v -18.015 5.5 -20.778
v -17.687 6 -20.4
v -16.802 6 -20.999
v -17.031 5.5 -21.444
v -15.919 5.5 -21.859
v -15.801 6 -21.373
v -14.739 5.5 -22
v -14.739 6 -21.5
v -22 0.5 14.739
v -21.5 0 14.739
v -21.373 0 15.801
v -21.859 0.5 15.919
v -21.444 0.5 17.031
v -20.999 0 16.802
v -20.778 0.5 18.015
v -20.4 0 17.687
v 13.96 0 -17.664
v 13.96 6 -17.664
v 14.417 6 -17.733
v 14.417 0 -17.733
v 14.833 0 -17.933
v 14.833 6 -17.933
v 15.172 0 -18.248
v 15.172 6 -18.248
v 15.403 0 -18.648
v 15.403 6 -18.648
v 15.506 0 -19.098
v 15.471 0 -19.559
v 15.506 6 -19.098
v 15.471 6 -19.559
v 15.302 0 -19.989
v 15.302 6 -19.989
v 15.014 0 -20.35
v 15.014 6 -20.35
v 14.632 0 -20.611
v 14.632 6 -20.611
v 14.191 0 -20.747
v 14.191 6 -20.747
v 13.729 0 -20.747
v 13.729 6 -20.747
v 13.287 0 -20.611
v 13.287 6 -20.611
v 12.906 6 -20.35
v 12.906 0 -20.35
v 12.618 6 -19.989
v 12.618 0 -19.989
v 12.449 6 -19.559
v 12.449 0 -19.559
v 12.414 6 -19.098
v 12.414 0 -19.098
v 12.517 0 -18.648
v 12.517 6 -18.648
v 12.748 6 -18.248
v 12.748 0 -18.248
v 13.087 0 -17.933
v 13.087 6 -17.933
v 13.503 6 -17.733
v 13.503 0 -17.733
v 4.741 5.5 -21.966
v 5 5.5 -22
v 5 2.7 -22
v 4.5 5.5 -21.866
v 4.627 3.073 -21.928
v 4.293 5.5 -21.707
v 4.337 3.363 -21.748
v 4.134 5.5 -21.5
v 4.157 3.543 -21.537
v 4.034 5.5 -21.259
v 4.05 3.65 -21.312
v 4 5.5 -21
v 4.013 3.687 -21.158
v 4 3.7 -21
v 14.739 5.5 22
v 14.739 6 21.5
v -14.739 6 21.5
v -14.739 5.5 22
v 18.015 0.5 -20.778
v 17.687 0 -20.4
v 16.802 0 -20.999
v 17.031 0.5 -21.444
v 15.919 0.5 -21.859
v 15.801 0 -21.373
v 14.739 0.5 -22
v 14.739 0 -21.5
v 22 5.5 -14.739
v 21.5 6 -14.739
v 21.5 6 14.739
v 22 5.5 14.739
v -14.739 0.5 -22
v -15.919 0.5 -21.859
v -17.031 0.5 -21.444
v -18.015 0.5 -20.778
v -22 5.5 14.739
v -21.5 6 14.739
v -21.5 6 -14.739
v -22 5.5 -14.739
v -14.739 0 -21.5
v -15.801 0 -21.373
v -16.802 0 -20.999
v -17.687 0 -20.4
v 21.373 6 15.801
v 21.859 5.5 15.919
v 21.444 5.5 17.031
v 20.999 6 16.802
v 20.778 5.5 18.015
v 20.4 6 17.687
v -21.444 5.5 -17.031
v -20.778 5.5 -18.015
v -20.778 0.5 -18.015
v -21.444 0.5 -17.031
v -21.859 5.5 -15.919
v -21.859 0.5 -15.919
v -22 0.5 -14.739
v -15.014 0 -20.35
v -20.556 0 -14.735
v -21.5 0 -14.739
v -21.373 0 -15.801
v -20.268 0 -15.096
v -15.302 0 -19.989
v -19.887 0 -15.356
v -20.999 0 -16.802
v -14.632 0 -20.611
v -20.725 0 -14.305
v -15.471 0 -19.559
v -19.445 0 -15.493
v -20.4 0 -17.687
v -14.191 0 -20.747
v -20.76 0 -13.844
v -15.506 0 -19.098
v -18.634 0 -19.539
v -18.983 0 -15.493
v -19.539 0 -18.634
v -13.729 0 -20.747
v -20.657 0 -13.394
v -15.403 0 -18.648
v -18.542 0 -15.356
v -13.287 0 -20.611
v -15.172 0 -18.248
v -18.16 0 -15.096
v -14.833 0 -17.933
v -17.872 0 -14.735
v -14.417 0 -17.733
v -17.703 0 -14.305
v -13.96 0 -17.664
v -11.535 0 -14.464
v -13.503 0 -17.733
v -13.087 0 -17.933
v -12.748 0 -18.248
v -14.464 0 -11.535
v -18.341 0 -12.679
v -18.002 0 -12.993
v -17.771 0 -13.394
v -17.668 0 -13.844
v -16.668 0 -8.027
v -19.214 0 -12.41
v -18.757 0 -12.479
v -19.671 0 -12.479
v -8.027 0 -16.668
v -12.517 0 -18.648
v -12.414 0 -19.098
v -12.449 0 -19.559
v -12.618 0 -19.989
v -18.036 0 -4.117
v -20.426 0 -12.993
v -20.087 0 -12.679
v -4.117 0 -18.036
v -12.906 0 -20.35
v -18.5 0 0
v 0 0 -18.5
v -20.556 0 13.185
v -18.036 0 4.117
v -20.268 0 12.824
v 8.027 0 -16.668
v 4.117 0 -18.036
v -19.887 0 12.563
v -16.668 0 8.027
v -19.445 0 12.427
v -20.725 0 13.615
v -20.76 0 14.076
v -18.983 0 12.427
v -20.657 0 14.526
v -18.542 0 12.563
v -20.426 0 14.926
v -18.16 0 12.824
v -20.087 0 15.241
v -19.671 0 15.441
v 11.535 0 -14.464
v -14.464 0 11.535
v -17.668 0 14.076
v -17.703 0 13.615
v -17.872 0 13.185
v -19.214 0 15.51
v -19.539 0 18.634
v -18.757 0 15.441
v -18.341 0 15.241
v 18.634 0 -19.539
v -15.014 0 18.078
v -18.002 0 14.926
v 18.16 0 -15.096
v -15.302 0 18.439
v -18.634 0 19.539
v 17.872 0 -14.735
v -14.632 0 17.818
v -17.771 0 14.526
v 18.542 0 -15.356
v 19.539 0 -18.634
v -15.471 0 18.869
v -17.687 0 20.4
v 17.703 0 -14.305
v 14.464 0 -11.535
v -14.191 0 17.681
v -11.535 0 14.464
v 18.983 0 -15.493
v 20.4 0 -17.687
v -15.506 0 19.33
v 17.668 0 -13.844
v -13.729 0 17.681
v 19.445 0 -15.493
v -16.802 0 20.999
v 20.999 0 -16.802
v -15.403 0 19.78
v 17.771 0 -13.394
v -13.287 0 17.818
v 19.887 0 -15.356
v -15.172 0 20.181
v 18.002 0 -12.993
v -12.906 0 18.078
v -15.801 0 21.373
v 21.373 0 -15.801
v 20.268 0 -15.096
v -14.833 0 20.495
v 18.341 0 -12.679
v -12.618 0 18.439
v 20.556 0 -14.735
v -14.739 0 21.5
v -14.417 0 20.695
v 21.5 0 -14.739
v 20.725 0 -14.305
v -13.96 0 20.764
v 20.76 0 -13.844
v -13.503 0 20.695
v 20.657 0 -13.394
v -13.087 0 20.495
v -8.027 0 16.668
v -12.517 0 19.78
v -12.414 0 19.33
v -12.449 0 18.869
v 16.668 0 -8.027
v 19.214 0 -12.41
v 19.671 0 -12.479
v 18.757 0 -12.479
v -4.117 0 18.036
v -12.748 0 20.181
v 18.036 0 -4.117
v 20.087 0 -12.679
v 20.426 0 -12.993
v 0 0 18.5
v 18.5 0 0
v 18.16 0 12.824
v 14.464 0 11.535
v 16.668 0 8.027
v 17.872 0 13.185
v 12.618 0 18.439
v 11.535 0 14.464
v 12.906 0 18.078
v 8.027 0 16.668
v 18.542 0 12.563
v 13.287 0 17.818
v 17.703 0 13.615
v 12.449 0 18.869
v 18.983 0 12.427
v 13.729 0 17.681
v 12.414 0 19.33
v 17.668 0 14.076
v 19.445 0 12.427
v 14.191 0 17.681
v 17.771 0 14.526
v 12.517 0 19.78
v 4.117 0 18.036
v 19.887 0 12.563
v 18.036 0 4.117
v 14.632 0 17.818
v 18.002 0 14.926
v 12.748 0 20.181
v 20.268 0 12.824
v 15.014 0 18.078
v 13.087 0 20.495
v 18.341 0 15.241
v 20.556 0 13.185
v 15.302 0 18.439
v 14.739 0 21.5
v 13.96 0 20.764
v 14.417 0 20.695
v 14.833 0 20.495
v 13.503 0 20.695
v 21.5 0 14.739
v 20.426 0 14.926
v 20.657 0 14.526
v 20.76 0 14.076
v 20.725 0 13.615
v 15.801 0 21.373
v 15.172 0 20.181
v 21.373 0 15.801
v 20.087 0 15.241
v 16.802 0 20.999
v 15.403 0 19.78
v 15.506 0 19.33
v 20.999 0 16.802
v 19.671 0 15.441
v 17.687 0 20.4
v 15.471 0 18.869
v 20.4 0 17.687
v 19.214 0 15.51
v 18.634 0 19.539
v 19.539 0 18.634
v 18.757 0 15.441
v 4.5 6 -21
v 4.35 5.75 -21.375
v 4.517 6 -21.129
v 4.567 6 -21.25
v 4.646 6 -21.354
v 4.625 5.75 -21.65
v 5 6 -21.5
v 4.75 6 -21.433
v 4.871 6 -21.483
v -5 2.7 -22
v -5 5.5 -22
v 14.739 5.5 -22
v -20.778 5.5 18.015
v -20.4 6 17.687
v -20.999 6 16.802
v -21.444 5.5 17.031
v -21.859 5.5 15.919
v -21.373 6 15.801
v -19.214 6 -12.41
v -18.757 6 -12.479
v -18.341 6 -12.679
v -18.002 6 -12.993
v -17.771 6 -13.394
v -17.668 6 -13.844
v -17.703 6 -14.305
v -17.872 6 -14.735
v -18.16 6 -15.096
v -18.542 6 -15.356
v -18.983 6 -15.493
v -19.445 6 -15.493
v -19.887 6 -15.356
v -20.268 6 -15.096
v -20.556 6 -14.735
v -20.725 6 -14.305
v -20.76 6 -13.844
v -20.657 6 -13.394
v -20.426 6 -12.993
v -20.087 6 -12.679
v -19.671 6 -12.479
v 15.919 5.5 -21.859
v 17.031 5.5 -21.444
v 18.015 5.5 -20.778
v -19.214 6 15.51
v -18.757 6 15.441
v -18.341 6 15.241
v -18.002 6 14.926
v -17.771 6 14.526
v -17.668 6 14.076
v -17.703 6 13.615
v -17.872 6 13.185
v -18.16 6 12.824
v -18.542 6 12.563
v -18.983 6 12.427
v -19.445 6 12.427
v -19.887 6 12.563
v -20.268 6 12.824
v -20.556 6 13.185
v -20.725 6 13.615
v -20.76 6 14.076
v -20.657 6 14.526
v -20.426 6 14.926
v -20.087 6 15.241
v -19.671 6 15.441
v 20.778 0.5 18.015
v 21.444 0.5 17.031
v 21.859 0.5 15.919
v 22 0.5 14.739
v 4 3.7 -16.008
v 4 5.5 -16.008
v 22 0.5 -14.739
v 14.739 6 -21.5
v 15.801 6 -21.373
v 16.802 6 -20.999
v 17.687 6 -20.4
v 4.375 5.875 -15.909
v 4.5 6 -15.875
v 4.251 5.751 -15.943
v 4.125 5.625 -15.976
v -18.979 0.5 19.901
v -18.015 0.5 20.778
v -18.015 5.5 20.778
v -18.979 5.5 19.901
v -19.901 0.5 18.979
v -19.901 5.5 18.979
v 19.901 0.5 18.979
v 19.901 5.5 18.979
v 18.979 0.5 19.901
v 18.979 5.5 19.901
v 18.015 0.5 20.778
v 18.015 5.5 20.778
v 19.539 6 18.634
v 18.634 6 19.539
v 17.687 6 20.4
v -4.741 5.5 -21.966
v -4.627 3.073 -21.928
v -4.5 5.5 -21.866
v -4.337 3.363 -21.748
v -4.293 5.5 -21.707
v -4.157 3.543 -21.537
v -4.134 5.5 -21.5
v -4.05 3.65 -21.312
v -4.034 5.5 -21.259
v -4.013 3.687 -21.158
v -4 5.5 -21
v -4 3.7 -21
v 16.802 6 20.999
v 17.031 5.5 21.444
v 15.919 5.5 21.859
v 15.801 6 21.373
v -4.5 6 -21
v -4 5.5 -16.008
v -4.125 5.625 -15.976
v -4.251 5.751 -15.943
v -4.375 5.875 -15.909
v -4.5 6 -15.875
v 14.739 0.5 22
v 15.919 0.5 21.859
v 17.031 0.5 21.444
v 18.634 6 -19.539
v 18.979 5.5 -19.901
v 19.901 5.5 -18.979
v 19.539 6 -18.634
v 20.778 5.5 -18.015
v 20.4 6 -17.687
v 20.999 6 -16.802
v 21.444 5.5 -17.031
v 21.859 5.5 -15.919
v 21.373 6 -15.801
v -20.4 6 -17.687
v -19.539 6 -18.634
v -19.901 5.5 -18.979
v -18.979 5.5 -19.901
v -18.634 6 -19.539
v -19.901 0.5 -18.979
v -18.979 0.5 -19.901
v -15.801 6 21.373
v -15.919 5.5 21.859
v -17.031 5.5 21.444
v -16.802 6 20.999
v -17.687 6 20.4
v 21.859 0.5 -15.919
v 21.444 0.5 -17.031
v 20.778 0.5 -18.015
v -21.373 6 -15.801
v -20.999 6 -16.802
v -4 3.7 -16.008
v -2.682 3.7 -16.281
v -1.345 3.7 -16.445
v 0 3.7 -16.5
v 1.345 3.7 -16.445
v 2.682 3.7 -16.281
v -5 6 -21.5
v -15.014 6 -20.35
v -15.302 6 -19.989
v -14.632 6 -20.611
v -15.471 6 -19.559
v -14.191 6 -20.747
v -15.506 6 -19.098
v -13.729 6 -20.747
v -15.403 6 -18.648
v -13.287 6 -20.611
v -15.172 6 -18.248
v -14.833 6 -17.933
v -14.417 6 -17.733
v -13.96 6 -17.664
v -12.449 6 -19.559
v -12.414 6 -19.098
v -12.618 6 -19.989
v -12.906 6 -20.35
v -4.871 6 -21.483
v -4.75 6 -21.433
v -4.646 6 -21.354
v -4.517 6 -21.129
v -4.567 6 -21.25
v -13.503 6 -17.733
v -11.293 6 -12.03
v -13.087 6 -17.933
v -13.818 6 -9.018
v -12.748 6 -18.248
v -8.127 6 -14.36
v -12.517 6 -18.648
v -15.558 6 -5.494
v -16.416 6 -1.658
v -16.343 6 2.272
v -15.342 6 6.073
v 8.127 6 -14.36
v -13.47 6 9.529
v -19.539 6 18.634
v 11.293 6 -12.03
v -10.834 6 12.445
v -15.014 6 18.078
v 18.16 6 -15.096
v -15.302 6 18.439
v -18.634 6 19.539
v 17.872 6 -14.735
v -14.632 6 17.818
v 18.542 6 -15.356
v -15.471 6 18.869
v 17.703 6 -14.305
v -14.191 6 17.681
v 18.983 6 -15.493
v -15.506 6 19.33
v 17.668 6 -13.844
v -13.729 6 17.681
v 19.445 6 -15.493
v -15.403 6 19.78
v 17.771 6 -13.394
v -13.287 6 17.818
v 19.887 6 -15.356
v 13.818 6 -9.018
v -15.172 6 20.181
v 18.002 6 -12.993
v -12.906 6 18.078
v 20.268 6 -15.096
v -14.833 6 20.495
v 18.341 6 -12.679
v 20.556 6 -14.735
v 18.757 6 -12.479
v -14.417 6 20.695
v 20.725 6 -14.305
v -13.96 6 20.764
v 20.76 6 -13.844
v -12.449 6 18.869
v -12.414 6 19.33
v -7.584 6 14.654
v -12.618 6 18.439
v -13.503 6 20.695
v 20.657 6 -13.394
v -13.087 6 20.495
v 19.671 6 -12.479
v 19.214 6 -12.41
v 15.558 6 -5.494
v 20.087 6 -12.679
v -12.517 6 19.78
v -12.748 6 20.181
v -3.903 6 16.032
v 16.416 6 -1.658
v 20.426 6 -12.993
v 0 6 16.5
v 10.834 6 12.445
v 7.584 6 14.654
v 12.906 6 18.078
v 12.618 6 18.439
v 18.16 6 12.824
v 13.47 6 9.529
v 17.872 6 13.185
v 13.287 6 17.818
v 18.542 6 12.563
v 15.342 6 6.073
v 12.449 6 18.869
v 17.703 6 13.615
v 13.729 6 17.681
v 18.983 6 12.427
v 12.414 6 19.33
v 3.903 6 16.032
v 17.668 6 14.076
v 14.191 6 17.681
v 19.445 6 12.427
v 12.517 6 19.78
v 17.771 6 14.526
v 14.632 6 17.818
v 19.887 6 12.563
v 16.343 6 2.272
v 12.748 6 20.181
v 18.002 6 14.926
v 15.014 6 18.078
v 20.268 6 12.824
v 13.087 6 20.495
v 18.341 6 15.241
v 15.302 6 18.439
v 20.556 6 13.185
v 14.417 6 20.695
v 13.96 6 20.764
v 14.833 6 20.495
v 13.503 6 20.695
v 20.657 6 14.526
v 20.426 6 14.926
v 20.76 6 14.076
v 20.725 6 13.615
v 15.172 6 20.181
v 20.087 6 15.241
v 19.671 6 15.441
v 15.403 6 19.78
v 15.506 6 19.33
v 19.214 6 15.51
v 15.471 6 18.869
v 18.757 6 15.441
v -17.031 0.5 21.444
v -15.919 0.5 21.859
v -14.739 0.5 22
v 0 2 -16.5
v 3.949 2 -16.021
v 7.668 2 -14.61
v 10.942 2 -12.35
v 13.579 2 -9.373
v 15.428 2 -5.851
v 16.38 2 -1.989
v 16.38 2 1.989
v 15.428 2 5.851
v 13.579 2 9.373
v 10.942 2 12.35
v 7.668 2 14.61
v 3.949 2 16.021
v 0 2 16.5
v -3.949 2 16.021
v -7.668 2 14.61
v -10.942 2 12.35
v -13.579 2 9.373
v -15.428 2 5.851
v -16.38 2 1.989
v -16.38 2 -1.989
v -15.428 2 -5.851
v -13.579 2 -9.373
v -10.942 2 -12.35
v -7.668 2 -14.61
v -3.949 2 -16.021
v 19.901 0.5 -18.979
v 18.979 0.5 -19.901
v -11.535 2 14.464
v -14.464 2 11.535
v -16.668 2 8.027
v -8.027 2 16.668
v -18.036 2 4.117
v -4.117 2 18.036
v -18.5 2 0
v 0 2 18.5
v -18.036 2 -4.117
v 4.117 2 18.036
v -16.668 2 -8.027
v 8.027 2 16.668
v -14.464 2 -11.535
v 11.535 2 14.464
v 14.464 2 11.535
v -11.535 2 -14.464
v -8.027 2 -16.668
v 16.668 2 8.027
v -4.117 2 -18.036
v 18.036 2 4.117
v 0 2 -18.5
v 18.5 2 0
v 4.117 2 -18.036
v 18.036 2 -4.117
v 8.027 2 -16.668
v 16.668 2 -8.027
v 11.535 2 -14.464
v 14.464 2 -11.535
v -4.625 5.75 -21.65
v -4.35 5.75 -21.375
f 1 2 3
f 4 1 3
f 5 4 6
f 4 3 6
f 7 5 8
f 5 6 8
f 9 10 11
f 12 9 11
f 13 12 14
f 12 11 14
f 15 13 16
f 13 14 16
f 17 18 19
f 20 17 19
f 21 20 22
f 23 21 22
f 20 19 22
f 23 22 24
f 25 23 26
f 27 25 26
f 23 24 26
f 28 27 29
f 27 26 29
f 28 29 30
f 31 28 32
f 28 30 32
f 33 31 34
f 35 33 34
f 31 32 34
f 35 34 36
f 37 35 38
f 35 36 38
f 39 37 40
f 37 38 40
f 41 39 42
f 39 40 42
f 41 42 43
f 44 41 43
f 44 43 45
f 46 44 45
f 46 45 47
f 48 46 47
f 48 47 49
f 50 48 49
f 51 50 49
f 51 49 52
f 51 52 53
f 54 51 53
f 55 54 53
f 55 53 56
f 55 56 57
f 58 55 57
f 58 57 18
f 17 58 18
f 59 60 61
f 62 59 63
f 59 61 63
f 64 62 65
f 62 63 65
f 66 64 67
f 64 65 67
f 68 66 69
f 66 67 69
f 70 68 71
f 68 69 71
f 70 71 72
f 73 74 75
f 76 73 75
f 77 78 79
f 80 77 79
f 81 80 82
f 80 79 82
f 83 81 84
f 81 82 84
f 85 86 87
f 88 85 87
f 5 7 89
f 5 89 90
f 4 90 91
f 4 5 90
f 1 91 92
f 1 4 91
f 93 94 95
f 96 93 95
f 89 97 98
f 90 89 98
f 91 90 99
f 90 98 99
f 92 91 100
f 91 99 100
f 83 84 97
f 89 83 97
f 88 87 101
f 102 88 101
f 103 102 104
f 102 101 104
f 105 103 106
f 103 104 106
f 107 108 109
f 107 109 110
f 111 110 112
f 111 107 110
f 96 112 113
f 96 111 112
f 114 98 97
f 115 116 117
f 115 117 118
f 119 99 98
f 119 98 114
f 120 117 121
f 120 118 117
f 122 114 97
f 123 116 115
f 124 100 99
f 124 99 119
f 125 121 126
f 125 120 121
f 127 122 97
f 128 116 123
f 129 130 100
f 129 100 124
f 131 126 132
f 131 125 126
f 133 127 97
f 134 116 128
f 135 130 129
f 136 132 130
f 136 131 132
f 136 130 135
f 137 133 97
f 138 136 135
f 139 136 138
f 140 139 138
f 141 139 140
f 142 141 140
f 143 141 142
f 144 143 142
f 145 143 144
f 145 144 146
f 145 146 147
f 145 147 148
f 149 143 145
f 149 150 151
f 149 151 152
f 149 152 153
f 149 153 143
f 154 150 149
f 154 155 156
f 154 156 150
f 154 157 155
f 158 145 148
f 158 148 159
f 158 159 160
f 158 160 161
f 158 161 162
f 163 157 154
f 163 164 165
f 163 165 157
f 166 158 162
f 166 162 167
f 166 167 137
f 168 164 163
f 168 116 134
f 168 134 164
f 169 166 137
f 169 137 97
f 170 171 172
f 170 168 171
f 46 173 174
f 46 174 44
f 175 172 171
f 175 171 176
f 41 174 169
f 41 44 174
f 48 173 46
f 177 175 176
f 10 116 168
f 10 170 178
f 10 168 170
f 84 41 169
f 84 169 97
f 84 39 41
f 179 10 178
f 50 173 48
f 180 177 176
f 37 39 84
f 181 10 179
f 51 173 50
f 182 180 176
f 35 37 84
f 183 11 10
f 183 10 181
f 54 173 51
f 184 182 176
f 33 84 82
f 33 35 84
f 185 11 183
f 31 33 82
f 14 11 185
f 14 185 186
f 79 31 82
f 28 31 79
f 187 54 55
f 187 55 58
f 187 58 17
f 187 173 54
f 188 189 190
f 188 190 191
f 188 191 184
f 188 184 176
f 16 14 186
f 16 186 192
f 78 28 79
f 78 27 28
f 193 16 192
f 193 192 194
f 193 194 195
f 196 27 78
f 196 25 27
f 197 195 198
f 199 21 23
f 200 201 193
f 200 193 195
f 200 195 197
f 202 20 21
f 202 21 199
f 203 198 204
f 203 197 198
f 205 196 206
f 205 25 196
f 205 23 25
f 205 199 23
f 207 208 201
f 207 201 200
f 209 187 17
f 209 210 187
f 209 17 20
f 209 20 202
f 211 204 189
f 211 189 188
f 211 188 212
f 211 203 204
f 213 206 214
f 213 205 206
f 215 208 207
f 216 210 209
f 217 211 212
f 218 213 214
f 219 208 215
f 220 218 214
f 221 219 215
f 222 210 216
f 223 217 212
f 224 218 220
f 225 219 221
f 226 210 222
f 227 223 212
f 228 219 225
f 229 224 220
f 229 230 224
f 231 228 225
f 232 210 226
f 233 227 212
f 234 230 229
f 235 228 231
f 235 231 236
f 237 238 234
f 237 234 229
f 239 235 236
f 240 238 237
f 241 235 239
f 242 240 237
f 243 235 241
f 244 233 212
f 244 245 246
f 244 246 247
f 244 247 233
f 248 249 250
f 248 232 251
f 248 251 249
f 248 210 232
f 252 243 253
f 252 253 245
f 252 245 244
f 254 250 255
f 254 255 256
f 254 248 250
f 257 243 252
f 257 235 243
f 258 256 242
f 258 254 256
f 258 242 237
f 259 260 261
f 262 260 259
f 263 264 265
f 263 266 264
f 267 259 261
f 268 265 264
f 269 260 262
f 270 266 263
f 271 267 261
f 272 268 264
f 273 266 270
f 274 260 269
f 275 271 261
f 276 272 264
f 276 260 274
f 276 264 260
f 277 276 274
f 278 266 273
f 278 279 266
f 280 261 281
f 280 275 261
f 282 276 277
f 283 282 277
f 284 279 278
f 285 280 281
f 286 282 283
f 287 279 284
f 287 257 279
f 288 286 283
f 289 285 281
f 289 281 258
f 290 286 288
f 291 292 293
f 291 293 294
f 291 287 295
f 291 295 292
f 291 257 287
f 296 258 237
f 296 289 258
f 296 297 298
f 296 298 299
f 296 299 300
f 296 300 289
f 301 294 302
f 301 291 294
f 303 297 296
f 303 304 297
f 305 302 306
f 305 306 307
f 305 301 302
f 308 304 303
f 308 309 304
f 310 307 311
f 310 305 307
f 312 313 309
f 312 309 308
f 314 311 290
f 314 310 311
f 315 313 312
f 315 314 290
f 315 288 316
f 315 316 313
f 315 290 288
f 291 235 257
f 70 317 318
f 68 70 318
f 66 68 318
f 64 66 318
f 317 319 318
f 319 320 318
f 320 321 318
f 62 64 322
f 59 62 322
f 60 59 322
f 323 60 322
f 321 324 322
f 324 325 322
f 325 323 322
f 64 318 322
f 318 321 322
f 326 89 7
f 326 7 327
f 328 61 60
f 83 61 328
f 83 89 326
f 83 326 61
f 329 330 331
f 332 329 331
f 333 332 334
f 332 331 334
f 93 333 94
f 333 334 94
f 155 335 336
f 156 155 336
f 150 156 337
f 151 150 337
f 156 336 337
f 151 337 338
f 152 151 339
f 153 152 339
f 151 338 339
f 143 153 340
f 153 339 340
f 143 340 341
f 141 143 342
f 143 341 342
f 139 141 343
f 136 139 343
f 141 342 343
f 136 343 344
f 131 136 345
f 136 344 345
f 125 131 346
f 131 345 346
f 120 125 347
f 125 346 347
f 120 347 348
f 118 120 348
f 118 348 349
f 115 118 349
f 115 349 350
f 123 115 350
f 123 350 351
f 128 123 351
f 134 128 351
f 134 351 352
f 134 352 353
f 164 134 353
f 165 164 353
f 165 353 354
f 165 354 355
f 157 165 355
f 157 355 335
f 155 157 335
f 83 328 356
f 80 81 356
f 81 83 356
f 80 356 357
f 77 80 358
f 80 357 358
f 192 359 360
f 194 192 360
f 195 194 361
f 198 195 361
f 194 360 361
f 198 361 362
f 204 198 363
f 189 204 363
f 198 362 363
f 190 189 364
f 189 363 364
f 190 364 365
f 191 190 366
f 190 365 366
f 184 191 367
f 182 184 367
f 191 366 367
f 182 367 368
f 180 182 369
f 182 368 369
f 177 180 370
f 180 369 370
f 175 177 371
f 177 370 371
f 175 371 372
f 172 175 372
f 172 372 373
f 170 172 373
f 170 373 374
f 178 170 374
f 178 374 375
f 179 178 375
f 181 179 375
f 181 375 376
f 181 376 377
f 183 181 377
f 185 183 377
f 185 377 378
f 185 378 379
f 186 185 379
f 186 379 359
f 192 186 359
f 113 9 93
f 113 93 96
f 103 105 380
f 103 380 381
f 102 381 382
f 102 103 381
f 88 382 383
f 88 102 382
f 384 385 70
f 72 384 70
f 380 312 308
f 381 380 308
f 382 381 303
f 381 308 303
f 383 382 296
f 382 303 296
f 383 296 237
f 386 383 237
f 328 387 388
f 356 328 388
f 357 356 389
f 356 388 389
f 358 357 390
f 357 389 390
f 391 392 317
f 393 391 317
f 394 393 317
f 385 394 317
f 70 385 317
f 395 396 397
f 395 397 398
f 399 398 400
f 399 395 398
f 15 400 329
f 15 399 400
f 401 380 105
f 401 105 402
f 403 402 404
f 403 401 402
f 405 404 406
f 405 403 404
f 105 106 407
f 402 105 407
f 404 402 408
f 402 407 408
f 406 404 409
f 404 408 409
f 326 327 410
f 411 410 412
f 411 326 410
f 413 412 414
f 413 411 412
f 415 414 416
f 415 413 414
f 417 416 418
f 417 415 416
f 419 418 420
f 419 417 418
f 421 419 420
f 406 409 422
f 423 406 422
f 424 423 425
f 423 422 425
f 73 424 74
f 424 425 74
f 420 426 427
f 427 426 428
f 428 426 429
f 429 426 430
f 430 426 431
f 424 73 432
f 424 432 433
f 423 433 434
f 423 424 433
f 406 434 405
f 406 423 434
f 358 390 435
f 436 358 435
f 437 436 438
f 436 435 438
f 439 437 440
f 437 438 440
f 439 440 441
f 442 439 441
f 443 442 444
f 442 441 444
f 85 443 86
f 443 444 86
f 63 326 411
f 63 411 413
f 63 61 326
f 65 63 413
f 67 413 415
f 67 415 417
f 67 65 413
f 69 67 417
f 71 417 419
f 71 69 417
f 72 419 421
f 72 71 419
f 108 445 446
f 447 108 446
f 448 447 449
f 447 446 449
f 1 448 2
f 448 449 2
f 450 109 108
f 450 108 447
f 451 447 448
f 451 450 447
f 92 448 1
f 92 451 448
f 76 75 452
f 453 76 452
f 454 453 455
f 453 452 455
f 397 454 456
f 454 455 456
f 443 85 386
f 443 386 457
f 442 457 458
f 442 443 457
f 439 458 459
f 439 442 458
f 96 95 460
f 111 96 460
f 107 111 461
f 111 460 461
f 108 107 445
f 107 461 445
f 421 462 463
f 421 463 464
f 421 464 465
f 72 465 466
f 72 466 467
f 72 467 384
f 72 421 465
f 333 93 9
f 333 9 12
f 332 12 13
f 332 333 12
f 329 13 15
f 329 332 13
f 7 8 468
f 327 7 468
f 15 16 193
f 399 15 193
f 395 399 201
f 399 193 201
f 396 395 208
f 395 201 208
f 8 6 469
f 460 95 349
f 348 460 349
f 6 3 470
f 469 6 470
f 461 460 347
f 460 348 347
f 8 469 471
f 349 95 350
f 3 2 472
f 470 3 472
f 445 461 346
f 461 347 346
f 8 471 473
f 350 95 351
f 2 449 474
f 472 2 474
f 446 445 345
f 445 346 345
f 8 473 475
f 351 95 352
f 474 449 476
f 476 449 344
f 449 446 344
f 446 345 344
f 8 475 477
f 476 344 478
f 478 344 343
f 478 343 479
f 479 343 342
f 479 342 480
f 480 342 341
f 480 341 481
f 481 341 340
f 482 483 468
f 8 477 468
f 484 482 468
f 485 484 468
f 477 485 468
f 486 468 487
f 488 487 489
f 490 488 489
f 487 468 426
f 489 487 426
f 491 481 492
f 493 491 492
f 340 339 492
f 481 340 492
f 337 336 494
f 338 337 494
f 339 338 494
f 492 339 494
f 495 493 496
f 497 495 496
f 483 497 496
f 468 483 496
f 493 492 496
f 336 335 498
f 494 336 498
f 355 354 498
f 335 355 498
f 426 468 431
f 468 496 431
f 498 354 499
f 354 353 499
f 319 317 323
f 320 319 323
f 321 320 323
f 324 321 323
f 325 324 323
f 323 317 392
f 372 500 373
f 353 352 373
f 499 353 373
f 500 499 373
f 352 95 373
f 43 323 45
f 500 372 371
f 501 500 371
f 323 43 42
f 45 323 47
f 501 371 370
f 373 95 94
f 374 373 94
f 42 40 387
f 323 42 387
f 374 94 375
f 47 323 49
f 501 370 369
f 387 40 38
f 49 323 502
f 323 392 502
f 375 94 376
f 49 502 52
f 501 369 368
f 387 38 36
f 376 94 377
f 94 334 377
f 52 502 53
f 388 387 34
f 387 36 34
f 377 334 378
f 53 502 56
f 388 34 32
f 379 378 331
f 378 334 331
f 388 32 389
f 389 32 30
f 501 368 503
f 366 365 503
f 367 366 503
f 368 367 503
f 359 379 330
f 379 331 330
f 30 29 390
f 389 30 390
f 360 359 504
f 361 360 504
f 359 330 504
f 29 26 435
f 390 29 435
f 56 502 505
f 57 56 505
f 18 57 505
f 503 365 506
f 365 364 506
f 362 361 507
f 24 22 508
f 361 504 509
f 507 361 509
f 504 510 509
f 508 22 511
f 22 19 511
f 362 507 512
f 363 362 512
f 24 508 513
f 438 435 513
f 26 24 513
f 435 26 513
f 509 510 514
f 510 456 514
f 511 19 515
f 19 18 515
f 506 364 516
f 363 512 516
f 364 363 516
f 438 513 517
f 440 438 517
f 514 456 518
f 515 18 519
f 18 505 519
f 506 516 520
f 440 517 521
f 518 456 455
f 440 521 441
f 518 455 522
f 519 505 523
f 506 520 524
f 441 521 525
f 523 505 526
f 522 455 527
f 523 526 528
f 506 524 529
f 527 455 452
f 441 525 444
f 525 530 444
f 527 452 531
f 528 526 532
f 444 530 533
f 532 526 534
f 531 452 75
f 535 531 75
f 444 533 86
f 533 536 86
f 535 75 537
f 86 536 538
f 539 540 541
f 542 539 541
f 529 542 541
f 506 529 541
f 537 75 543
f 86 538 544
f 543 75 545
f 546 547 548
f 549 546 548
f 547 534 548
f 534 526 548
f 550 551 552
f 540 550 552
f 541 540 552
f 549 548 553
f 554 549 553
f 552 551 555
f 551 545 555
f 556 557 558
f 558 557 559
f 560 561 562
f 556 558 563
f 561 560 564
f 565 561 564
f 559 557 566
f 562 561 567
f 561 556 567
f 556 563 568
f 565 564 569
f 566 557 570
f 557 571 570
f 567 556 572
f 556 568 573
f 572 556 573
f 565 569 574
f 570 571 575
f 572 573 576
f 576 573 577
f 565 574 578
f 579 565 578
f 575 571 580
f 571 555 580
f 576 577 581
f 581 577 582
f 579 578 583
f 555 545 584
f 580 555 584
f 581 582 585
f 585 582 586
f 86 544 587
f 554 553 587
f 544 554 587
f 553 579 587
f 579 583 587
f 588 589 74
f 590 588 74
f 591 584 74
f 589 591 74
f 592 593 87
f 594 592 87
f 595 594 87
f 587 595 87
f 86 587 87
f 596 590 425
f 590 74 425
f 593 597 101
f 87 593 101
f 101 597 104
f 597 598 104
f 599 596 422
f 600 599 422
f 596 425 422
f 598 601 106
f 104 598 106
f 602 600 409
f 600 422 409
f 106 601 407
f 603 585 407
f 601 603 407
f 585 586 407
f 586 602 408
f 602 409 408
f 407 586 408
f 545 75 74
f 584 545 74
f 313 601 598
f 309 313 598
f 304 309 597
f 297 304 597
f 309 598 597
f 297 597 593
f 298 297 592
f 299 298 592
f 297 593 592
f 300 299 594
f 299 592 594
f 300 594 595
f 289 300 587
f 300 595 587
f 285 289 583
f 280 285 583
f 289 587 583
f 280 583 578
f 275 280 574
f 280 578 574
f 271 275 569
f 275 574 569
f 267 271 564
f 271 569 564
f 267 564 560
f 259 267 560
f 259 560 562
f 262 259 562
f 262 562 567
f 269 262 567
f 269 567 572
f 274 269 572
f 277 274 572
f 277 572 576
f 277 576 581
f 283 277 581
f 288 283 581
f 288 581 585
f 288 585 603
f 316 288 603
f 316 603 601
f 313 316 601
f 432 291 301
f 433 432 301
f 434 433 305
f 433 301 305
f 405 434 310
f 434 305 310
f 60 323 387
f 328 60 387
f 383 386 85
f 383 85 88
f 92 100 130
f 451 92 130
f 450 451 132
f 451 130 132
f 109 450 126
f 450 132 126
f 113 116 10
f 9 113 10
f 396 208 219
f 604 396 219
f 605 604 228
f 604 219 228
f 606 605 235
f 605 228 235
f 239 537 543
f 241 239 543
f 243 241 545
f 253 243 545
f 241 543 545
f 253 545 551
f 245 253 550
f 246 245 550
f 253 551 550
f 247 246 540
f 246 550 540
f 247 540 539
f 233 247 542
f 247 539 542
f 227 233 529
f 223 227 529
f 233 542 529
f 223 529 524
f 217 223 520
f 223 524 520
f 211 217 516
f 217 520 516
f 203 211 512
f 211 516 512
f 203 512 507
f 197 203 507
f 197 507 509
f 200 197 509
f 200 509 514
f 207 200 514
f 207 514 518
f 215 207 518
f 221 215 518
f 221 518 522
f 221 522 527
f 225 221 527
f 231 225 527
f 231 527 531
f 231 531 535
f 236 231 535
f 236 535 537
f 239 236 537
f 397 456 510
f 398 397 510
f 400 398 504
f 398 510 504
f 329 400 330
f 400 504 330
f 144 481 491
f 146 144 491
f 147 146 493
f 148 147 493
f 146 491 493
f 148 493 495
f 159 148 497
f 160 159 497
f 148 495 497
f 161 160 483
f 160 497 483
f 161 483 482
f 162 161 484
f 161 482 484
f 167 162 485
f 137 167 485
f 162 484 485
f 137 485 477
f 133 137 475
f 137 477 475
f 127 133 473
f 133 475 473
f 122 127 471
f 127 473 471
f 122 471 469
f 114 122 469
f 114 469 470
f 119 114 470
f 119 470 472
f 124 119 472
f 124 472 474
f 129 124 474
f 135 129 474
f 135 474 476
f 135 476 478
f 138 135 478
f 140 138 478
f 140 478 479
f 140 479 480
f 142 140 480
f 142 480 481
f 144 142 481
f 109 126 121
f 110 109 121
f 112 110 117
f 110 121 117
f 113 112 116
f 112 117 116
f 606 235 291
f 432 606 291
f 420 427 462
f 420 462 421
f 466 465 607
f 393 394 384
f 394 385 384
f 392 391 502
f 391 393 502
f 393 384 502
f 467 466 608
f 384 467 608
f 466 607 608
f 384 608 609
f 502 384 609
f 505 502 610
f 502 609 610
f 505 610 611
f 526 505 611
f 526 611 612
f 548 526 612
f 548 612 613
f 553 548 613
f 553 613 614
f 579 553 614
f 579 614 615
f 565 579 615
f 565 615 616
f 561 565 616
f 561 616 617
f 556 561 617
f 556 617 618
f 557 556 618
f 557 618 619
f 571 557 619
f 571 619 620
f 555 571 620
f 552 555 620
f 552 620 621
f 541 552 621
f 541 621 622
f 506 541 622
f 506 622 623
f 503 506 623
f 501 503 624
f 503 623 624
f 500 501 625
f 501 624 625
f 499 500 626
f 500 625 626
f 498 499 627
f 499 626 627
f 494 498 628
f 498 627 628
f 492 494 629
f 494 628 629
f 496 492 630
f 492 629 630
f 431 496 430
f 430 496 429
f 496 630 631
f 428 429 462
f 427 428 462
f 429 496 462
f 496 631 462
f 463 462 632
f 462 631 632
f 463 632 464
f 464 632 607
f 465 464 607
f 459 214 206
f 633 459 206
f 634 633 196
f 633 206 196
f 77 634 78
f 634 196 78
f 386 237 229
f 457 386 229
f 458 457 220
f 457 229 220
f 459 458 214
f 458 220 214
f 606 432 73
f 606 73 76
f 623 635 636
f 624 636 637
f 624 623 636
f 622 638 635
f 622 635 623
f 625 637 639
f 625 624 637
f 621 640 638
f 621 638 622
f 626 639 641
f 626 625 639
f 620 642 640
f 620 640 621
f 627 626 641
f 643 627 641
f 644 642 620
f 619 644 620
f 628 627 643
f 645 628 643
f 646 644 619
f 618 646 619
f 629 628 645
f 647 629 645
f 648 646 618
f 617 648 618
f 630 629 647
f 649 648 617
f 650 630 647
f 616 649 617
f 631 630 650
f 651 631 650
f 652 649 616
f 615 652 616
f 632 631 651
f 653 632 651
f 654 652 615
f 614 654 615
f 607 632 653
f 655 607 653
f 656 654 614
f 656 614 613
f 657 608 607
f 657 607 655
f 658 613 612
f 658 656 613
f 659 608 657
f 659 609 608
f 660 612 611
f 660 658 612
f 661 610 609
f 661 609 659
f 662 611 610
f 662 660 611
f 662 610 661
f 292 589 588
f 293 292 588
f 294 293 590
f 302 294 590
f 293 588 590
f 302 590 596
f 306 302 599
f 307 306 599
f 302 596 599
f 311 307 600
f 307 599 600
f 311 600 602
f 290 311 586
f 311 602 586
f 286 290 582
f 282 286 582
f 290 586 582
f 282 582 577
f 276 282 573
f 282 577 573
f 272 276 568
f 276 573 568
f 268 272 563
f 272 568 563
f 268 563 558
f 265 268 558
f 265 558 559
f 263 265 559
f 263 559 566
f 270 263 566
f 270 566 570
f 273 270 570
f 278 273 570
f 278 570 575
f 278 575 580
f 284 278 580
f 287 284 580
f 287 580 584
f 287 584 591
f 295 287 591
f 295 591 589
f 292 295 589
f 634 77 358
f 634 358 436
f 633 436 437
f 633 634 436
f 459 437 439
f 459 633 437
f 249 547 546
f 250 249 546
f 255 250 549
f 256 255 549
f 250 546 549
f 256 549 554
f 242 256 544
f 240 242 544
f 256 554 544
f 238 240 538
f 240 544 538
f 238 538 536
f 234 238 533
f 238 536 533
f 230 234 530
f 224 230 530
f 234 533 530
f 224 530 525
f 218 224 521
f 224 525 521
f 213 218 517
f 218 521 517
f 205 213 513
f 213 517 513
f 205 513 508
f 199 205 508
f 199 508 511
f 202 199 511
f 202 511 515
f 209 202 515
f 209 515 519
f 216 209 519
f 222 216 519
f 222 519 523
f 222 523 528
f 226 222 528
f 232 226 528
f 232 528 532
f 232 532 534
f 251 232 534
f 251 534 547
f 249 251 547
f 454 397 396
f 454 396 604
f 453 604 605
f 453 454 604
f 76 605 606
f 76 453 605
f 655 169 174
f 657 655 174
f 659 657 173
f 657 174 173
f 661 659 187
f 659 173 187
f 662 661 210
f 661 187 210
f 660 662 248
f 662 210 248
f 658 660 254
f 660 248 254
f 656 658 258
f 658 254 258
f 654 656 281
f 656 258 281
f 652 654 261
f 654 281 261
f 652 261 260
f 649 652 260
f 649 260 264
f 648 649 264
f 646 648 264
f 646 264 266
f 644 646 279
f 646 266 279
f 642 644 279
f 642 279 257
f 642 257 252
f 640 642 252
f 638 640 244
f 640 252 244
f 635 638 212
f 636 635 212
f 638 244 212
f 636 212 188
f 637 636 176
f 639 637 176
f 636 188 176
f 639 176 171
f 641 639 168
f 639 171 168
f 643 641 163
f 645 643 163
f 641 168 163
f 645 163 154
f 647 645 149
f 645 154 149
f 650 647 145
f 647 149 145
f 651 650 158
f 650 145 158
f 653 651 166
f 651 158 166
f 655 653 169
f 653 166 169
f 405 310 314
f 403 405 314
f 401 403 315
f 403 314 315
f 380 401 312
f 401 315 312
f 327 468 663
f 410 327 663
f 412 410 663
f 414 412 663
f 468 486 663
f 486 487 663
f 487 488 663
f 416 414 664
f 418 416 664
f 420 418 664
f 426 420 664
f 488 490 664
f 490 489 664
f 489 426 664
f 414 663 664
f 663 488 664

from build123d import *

# Parameters (mm, degrees)
EXTRUDE_1_DEPTH      = 6
SKETCH_2_R           = 10.5
CUT_EXTRUDE_1_DEPTH  = 10
SKETCH_3_R           = 1.55
CUT_EXTRUDE_2_DEPTH  = 10
SKETCH_7_W           = 16
SKETCH_7_H           = 44.832254491
CUT_EXTRUDE_4_DEPTH  = 10
FILLET_1_R           = 3
FILLET_2_R           = 5
EXTRUDE_START        = -6
EXTRUDE_2_DEPTH      = 6
SKETCH_9_R           = 9.75
CUT_EXTRUDE_5_DEPTH  = 32.685959036
SKETCH_10_R          = 13
CUT_EXTRUDE_6_DEPTH  = 2
SKETCH_11_W          = 8
SKETCH_11_H          = 16
CUT_EXTRUDE_7_DEPTH  = 2.3
FILLET_3_R           = 1
EXTRUDE_3_DEPTH      = 6
SKETCH_13_W          = 8
SKETCH_13_H          = 3
CUT_EXTRUDE_8_DEPTH  = 2.3
FILLET_4_R           = 1
CHAMFER_1_SIZE       = 0.5
EXTRUDE_START_2      = 3
SKETCH_14_R          = 15
SKETCH_14_R_2        = 13
EXTRUDE_4_DEPTH      = 3
CHAMFER_2_SIZE       = 0.5
SKETCH_15_R          = 17.000673468
CUT_EXTRUDE_9_DEPTH  = 23
SKETCH_17_R          = 18.5
CUT_EXTRUDE_11_DEPTH = 2
SKETCH_18_R          = 16.5
CUT_EXTRUDE_12_DEPTH = 14


with BuildPart() as part:
    # 草图1 → 凸台-拉伸1 (new body)
    with BuildSketch(Plane(origin=(0, 0, 0), x_dir=(1, 0, 0), z_dir=(0, 1, 0))):
        with BuildLine():
            Line((-16.5, 22), (16.5, 22))
            ThreePointArc((16.5, 22), (19.445436483, 19.445436483), (22, 16.5))
            Line((22, 16.5), (22, -16.5))
            ThreePointArc((22, -16.5), (19.445436483, -19.445436483), (16.5, -22))
            Line((16.5, -22), (-16.5, -22))
            ThreePointArc((-16.5, -22), (-19.445436483, -19.445436483), (-22, -16.5))
            Line((-22, -16.5), (-22, 16.5))
            ThreePointArc((-22, 16.5), (-19.445436483, 19.445436483), (-16.5, 22))
        make_face()
    extrude(amount=EXTRUDE_1_DEPTH)

    # 草图2 → 切除-拉伸1 (cut)
    with BuildSketch(Plane(origin=(0, 6, 0), x_dir=(1, 0, 0), z_dir=(0, 1, 0))):
        with Locations(Location((0, 0, 0), (0, 0, 270))):
            Circle(SKETCH_2_R)
    extrude(amount=-CUT_EXTRUDE_1_DEPTH, mode=Mode.SUBTRACT)

    # 草图3 → 切除-拉伸2 (cut)
    with BuildSketch(Plane(origin=(0, 6, 0), x_dir=(1, 0, 0), z_dir=(0, 1, 0))):
        with Locations(Location((-19.214153616, 13.959899742, 0), (0, 0, 270))):
            Circle(SKETCH_3_R)
        with Locations(Location((-13.959899742, 19.214153616, 0), (0, 0, 270))):
            Circle(SKETCH_3_R)
        with Locations(Location((19.214153616, 13.959899742, 0), (0, 0, 270))):
            Circle(SKETCH_3_R)
        with Locations(Location((13.959899742, 19.214153616, 0), (0, 0, 270))):
            Circle(SKETCH_3_R)
        with Locations(Location((19.214153616, -13.959899742, 0), (0, 0, 270))):
            Circle(SKETCH_3_R)
        with Locations(Location((13.959899742, -19.214153616, 0), (0, 0, 270))):
            Circle(SKETCH_3_R)
        with Locations(Location((-19.214153616, -13.959899742, 0), (0, 0, 270))):
            Circle(SKETCH_3_R)
        with Locations(Location((-13.959899742, -19.214153616, 0), (0, 0, 270))):
            Circle(SKETCH_3_R)
    extrude(amount=-CUT_EXTRUDE_2_DEPTH, mode=Mode.SUBTRACT)

    # 草图7 → 切除-拉伸4 (cut)
    with BuildSketch(Plane(origin=(0, 6, 0), x_dir=(1, 0, 0), z_dir=(0, 1, 0))):
        with Locations((0, 26.514900262)):
            Rectangle(SKETCH_7_W, SKETCH_7_H)
    extrude(amount=-CUT_EXTRUDE_4_DEPTH, mode=Mode.SUBTRACT)

    # 圆角1
    fillet_1_edges = [part.edges().sort_by_distance(p)[0] for p in [
        (-8, 3, -22),
        (8, 3, -22),
    ]]
    fillet(fillet_1_edges, radius=FILLET_1_R)

    # 圆角2
    fillet_2_edges = [part.edges().sort_by_distance(p)[0] for p in [
        (-16.5, 3, -22),
        (16.5, 3, -22),
        (22, 3, -16.5),
        (22, 3, 16.5),
        (16.5, 3, 22),
        (-16.5, 3, 22),
        (-22, 3, 16.5),
        (-22, 3, -16.5),
    ]]
    fillet(fillet_2_edges, radius=FILLET_2_R)

    # 草图8 → 凸台-拉伸2 (add)
    with BuildSketch(Plane.XZ.offset(EXTRUDE_START)):
        with BuildLine():
            Line((8, -6.800735254), (8, -19))
            Line((8, -19), (-8, -19))
            Line((-8, -19), (-8, -6.800735254))
            ThreePointArc((-8, -6.800735254), (0, 10.5), (8, -6.800735254))
        make_face()
    extrude(amount=EXTRUDE_2_DEPTH)

    # 草图9 → 切除-拉伸5 (cut, through all)
    with BuildSketch(Plane.XZ):
        with Locations(Location((0, 0, 0), (0, 0, 270))):
            Circle(SKETCH_9_R)
    extrude(amount=-CUT_EXTRUDE_5_DEPTH, mode=Mode.SUBTRACT)

    # 草图10 → 切除-拉伸6 (cut)
    with BuildSketch(Plane.XZ):
        with Locations(Location((0, 0, 0), (0, 0, 270))):
            Circle(SKETCH_10_R)
    extrude(amount=-CUT_EXTRUDE_6_DEPTH, mode=Mode.SUBTRACT)

    # 草图11 → 切除-拉伸7 (cut)
    with BuildSketch(Plane(origin=(0, 6, 0), x_dir=(1, 0, 0), z_dir=(0, 1, 0))):
        with Locations((0, 16.891709622)):
            Rectangle(SKETCH_11_W, SKETCH_11_H)
    extrude(amount=-CUT_EXTRUDE_7_DEPTH, mode=Mode.SUBTRACT)

    # 圆角3
    fillet_3_edges = [part.edges().sort_by_distance(p)[0] for p in [
        (4, 4.85, -8.891709622),
        (-4, 4.85, -8.891709622),
        (2.045523305, 3.7, -9.533012871),
    ]]
    fillet(fillet_3_edges, radius=FILLET_3_R)

    # 草图12 → 凸台-拉伸3 (add)
    with BuildSketch(Plane.XZ):
        with BuildLine():
            Line((-11, -22), (11, -22))
            ThreePointArc((11, -22), (8.878679656, -21.121320344), (8, -19))
            Line((8, -19), (-8, -19))
            ThreePointArc((-8, -19), (-8.878679656, -21.121320344), (-11, -22))
        make_face()
    extrude(amount=-EXTRUDE_3_DEPTH)

    # 草图13 → 切除-拉伸8 (cut)
    with BuildSketch(Plane(origin=(0, 6, 0), x_dir=(1, 0, 0), z_dir=(0, 1, 0))):
        with Locations((0, 20.5)):
            Rectangle(SKETCH_13_W, SKETCH_13_H)
    extrude(amount=-CUT_EXTRUDE_8_DEPTH, mode=Mode.SUBTRACT)

    # 圆角4
    fillet_4_edges = [part.edges().sort_by_distance(p)[0] for p in [
        (0, 3.7, -22),
        (-4, 4.85, -22),
        (4, 4.85, -22),
    ]]
    fillet(fillet_4_edges, radius=FILLET_4_R)

    # 倒角1
    chamfer_1_edges = [part.edges().sort_by_distance(p)[0] for p in [
        (9.869701486, 6, -22),
        (0, 0, -22),
        (19.445436483, 0, 19.445436483),
        (19.445436483, 6, 19.445436483),
        (19.445436483, 0, -19.445436483),
        (22, 0, 0),
        (0, 0, 22),
        (-19.445436483, 0, 19.445436483),
        (-22, 0, 0),
        (-19.445436483, 0, -19.445436483),
        (-16.48741772, 0, -21.684489774),
        (-21.684489774, 0, -16.48741772),
        (-21.684489774, 0, 16.48741772),
        (-16.48741772, 0, 21.684489774),
        (16.48741772, 0, -21.684489774),
        (21.684489774, 0, -16.48741772),
        (21.684489774, 0, 16.48741772),
        (16.48741772, 0, 21.684489774),
        (0, 6, 22),
        (-19.445436483, 6, -19.445436483),
        (-22, 6, 0),
        (-19.445436483, 6, 19.445436483),
        (22, 6, 0),
        (19.445436483, 6, -19.445436483),
        (-16.48741772, 6, -21.684489774),
        (-21.684489774, 6, -16.48741772),
        (-21.684489774, 6, 16.48741772),
        (-16.48741772, 6, 21.684489774),
        (16.48741772, 6, -21.684489774),
        (21.684489774, 6, -16.48741772),
        (21.684489774, 6, 16.48741772),
        (16.48741772, 6, 21.684489774),
        (0, 6, 9.75),
        (4, 6, -15.258216578),
        (4.144103897, 6, -8.999285342),
        (-4.144103897, 6, -8.999285342),
        (-4, 6, -15.258216578),
        (-9.869701486, 6, -22),
        (4.292893219, 6, -21.707106781),
        (-4.292893219, 6, -21.707106781),
    ]]
    chamfer(chamfer_1_edges, length=CHAMFER_1_SIZE)

    # 草图14 → 凸台-拉伸4 (add)
    with BuildSketch(Plane.XZ.offset(EXTRUDE_START_2)):
        with Locations(Location((0, 0, 0), (0, 0, 90))):
            Circle(SKETCH_14_R)
        with Locations(Location((0, 0, 0), (0, 0, 270))):
            Circle(SKETCH_14_R_2, mode=Mode.SUBTRACT)
    extrude(amount=-EXTRUDE_4_DEPTH)

    # 倒角2
    chamfer_2_edges = [part.edges().sort_by_distance(p)[0] for p in [
        (0, -3, -15),
        (0, -3, 13),
    ]]
    chamfer(chamfer_2_edges, length=CHAMFER_2_SIZE)

    # 草图15 → 切除-拉伸9 (cut)
    with BuildSketch(Plane.XZ):
        Circle(SKETCH_15_R)
    extrude(amount=CUT_EXTRUDE_9_DEPTH, mode=Mode.SUBTRACT)

    # 草图17 → 切除-拉伸11 (cut)
    with BuildSketch(Plane.XZ):
        with Locations(Location((0, 0, 0), (0, 0, 270))):
            Circle(SKETCH_17_R)
    extrude(amount=-CUT_EXTRUDE_11_DEPTH, mode=Mode.SUBTRACT)

    # 草图18 → 切除-拉伸12 (cut)
    with BuildSketch(Plane.XZ.offset(-2)):
        with Locations(Location((0, 0, 0), (0, 0, 270))):
            Circle(SKETCH_18_R)
    extrude(amount=-CUT_EXTRUDE_12_DEPTH, mode=Mode.SUBTRACT)


solid = part.part
